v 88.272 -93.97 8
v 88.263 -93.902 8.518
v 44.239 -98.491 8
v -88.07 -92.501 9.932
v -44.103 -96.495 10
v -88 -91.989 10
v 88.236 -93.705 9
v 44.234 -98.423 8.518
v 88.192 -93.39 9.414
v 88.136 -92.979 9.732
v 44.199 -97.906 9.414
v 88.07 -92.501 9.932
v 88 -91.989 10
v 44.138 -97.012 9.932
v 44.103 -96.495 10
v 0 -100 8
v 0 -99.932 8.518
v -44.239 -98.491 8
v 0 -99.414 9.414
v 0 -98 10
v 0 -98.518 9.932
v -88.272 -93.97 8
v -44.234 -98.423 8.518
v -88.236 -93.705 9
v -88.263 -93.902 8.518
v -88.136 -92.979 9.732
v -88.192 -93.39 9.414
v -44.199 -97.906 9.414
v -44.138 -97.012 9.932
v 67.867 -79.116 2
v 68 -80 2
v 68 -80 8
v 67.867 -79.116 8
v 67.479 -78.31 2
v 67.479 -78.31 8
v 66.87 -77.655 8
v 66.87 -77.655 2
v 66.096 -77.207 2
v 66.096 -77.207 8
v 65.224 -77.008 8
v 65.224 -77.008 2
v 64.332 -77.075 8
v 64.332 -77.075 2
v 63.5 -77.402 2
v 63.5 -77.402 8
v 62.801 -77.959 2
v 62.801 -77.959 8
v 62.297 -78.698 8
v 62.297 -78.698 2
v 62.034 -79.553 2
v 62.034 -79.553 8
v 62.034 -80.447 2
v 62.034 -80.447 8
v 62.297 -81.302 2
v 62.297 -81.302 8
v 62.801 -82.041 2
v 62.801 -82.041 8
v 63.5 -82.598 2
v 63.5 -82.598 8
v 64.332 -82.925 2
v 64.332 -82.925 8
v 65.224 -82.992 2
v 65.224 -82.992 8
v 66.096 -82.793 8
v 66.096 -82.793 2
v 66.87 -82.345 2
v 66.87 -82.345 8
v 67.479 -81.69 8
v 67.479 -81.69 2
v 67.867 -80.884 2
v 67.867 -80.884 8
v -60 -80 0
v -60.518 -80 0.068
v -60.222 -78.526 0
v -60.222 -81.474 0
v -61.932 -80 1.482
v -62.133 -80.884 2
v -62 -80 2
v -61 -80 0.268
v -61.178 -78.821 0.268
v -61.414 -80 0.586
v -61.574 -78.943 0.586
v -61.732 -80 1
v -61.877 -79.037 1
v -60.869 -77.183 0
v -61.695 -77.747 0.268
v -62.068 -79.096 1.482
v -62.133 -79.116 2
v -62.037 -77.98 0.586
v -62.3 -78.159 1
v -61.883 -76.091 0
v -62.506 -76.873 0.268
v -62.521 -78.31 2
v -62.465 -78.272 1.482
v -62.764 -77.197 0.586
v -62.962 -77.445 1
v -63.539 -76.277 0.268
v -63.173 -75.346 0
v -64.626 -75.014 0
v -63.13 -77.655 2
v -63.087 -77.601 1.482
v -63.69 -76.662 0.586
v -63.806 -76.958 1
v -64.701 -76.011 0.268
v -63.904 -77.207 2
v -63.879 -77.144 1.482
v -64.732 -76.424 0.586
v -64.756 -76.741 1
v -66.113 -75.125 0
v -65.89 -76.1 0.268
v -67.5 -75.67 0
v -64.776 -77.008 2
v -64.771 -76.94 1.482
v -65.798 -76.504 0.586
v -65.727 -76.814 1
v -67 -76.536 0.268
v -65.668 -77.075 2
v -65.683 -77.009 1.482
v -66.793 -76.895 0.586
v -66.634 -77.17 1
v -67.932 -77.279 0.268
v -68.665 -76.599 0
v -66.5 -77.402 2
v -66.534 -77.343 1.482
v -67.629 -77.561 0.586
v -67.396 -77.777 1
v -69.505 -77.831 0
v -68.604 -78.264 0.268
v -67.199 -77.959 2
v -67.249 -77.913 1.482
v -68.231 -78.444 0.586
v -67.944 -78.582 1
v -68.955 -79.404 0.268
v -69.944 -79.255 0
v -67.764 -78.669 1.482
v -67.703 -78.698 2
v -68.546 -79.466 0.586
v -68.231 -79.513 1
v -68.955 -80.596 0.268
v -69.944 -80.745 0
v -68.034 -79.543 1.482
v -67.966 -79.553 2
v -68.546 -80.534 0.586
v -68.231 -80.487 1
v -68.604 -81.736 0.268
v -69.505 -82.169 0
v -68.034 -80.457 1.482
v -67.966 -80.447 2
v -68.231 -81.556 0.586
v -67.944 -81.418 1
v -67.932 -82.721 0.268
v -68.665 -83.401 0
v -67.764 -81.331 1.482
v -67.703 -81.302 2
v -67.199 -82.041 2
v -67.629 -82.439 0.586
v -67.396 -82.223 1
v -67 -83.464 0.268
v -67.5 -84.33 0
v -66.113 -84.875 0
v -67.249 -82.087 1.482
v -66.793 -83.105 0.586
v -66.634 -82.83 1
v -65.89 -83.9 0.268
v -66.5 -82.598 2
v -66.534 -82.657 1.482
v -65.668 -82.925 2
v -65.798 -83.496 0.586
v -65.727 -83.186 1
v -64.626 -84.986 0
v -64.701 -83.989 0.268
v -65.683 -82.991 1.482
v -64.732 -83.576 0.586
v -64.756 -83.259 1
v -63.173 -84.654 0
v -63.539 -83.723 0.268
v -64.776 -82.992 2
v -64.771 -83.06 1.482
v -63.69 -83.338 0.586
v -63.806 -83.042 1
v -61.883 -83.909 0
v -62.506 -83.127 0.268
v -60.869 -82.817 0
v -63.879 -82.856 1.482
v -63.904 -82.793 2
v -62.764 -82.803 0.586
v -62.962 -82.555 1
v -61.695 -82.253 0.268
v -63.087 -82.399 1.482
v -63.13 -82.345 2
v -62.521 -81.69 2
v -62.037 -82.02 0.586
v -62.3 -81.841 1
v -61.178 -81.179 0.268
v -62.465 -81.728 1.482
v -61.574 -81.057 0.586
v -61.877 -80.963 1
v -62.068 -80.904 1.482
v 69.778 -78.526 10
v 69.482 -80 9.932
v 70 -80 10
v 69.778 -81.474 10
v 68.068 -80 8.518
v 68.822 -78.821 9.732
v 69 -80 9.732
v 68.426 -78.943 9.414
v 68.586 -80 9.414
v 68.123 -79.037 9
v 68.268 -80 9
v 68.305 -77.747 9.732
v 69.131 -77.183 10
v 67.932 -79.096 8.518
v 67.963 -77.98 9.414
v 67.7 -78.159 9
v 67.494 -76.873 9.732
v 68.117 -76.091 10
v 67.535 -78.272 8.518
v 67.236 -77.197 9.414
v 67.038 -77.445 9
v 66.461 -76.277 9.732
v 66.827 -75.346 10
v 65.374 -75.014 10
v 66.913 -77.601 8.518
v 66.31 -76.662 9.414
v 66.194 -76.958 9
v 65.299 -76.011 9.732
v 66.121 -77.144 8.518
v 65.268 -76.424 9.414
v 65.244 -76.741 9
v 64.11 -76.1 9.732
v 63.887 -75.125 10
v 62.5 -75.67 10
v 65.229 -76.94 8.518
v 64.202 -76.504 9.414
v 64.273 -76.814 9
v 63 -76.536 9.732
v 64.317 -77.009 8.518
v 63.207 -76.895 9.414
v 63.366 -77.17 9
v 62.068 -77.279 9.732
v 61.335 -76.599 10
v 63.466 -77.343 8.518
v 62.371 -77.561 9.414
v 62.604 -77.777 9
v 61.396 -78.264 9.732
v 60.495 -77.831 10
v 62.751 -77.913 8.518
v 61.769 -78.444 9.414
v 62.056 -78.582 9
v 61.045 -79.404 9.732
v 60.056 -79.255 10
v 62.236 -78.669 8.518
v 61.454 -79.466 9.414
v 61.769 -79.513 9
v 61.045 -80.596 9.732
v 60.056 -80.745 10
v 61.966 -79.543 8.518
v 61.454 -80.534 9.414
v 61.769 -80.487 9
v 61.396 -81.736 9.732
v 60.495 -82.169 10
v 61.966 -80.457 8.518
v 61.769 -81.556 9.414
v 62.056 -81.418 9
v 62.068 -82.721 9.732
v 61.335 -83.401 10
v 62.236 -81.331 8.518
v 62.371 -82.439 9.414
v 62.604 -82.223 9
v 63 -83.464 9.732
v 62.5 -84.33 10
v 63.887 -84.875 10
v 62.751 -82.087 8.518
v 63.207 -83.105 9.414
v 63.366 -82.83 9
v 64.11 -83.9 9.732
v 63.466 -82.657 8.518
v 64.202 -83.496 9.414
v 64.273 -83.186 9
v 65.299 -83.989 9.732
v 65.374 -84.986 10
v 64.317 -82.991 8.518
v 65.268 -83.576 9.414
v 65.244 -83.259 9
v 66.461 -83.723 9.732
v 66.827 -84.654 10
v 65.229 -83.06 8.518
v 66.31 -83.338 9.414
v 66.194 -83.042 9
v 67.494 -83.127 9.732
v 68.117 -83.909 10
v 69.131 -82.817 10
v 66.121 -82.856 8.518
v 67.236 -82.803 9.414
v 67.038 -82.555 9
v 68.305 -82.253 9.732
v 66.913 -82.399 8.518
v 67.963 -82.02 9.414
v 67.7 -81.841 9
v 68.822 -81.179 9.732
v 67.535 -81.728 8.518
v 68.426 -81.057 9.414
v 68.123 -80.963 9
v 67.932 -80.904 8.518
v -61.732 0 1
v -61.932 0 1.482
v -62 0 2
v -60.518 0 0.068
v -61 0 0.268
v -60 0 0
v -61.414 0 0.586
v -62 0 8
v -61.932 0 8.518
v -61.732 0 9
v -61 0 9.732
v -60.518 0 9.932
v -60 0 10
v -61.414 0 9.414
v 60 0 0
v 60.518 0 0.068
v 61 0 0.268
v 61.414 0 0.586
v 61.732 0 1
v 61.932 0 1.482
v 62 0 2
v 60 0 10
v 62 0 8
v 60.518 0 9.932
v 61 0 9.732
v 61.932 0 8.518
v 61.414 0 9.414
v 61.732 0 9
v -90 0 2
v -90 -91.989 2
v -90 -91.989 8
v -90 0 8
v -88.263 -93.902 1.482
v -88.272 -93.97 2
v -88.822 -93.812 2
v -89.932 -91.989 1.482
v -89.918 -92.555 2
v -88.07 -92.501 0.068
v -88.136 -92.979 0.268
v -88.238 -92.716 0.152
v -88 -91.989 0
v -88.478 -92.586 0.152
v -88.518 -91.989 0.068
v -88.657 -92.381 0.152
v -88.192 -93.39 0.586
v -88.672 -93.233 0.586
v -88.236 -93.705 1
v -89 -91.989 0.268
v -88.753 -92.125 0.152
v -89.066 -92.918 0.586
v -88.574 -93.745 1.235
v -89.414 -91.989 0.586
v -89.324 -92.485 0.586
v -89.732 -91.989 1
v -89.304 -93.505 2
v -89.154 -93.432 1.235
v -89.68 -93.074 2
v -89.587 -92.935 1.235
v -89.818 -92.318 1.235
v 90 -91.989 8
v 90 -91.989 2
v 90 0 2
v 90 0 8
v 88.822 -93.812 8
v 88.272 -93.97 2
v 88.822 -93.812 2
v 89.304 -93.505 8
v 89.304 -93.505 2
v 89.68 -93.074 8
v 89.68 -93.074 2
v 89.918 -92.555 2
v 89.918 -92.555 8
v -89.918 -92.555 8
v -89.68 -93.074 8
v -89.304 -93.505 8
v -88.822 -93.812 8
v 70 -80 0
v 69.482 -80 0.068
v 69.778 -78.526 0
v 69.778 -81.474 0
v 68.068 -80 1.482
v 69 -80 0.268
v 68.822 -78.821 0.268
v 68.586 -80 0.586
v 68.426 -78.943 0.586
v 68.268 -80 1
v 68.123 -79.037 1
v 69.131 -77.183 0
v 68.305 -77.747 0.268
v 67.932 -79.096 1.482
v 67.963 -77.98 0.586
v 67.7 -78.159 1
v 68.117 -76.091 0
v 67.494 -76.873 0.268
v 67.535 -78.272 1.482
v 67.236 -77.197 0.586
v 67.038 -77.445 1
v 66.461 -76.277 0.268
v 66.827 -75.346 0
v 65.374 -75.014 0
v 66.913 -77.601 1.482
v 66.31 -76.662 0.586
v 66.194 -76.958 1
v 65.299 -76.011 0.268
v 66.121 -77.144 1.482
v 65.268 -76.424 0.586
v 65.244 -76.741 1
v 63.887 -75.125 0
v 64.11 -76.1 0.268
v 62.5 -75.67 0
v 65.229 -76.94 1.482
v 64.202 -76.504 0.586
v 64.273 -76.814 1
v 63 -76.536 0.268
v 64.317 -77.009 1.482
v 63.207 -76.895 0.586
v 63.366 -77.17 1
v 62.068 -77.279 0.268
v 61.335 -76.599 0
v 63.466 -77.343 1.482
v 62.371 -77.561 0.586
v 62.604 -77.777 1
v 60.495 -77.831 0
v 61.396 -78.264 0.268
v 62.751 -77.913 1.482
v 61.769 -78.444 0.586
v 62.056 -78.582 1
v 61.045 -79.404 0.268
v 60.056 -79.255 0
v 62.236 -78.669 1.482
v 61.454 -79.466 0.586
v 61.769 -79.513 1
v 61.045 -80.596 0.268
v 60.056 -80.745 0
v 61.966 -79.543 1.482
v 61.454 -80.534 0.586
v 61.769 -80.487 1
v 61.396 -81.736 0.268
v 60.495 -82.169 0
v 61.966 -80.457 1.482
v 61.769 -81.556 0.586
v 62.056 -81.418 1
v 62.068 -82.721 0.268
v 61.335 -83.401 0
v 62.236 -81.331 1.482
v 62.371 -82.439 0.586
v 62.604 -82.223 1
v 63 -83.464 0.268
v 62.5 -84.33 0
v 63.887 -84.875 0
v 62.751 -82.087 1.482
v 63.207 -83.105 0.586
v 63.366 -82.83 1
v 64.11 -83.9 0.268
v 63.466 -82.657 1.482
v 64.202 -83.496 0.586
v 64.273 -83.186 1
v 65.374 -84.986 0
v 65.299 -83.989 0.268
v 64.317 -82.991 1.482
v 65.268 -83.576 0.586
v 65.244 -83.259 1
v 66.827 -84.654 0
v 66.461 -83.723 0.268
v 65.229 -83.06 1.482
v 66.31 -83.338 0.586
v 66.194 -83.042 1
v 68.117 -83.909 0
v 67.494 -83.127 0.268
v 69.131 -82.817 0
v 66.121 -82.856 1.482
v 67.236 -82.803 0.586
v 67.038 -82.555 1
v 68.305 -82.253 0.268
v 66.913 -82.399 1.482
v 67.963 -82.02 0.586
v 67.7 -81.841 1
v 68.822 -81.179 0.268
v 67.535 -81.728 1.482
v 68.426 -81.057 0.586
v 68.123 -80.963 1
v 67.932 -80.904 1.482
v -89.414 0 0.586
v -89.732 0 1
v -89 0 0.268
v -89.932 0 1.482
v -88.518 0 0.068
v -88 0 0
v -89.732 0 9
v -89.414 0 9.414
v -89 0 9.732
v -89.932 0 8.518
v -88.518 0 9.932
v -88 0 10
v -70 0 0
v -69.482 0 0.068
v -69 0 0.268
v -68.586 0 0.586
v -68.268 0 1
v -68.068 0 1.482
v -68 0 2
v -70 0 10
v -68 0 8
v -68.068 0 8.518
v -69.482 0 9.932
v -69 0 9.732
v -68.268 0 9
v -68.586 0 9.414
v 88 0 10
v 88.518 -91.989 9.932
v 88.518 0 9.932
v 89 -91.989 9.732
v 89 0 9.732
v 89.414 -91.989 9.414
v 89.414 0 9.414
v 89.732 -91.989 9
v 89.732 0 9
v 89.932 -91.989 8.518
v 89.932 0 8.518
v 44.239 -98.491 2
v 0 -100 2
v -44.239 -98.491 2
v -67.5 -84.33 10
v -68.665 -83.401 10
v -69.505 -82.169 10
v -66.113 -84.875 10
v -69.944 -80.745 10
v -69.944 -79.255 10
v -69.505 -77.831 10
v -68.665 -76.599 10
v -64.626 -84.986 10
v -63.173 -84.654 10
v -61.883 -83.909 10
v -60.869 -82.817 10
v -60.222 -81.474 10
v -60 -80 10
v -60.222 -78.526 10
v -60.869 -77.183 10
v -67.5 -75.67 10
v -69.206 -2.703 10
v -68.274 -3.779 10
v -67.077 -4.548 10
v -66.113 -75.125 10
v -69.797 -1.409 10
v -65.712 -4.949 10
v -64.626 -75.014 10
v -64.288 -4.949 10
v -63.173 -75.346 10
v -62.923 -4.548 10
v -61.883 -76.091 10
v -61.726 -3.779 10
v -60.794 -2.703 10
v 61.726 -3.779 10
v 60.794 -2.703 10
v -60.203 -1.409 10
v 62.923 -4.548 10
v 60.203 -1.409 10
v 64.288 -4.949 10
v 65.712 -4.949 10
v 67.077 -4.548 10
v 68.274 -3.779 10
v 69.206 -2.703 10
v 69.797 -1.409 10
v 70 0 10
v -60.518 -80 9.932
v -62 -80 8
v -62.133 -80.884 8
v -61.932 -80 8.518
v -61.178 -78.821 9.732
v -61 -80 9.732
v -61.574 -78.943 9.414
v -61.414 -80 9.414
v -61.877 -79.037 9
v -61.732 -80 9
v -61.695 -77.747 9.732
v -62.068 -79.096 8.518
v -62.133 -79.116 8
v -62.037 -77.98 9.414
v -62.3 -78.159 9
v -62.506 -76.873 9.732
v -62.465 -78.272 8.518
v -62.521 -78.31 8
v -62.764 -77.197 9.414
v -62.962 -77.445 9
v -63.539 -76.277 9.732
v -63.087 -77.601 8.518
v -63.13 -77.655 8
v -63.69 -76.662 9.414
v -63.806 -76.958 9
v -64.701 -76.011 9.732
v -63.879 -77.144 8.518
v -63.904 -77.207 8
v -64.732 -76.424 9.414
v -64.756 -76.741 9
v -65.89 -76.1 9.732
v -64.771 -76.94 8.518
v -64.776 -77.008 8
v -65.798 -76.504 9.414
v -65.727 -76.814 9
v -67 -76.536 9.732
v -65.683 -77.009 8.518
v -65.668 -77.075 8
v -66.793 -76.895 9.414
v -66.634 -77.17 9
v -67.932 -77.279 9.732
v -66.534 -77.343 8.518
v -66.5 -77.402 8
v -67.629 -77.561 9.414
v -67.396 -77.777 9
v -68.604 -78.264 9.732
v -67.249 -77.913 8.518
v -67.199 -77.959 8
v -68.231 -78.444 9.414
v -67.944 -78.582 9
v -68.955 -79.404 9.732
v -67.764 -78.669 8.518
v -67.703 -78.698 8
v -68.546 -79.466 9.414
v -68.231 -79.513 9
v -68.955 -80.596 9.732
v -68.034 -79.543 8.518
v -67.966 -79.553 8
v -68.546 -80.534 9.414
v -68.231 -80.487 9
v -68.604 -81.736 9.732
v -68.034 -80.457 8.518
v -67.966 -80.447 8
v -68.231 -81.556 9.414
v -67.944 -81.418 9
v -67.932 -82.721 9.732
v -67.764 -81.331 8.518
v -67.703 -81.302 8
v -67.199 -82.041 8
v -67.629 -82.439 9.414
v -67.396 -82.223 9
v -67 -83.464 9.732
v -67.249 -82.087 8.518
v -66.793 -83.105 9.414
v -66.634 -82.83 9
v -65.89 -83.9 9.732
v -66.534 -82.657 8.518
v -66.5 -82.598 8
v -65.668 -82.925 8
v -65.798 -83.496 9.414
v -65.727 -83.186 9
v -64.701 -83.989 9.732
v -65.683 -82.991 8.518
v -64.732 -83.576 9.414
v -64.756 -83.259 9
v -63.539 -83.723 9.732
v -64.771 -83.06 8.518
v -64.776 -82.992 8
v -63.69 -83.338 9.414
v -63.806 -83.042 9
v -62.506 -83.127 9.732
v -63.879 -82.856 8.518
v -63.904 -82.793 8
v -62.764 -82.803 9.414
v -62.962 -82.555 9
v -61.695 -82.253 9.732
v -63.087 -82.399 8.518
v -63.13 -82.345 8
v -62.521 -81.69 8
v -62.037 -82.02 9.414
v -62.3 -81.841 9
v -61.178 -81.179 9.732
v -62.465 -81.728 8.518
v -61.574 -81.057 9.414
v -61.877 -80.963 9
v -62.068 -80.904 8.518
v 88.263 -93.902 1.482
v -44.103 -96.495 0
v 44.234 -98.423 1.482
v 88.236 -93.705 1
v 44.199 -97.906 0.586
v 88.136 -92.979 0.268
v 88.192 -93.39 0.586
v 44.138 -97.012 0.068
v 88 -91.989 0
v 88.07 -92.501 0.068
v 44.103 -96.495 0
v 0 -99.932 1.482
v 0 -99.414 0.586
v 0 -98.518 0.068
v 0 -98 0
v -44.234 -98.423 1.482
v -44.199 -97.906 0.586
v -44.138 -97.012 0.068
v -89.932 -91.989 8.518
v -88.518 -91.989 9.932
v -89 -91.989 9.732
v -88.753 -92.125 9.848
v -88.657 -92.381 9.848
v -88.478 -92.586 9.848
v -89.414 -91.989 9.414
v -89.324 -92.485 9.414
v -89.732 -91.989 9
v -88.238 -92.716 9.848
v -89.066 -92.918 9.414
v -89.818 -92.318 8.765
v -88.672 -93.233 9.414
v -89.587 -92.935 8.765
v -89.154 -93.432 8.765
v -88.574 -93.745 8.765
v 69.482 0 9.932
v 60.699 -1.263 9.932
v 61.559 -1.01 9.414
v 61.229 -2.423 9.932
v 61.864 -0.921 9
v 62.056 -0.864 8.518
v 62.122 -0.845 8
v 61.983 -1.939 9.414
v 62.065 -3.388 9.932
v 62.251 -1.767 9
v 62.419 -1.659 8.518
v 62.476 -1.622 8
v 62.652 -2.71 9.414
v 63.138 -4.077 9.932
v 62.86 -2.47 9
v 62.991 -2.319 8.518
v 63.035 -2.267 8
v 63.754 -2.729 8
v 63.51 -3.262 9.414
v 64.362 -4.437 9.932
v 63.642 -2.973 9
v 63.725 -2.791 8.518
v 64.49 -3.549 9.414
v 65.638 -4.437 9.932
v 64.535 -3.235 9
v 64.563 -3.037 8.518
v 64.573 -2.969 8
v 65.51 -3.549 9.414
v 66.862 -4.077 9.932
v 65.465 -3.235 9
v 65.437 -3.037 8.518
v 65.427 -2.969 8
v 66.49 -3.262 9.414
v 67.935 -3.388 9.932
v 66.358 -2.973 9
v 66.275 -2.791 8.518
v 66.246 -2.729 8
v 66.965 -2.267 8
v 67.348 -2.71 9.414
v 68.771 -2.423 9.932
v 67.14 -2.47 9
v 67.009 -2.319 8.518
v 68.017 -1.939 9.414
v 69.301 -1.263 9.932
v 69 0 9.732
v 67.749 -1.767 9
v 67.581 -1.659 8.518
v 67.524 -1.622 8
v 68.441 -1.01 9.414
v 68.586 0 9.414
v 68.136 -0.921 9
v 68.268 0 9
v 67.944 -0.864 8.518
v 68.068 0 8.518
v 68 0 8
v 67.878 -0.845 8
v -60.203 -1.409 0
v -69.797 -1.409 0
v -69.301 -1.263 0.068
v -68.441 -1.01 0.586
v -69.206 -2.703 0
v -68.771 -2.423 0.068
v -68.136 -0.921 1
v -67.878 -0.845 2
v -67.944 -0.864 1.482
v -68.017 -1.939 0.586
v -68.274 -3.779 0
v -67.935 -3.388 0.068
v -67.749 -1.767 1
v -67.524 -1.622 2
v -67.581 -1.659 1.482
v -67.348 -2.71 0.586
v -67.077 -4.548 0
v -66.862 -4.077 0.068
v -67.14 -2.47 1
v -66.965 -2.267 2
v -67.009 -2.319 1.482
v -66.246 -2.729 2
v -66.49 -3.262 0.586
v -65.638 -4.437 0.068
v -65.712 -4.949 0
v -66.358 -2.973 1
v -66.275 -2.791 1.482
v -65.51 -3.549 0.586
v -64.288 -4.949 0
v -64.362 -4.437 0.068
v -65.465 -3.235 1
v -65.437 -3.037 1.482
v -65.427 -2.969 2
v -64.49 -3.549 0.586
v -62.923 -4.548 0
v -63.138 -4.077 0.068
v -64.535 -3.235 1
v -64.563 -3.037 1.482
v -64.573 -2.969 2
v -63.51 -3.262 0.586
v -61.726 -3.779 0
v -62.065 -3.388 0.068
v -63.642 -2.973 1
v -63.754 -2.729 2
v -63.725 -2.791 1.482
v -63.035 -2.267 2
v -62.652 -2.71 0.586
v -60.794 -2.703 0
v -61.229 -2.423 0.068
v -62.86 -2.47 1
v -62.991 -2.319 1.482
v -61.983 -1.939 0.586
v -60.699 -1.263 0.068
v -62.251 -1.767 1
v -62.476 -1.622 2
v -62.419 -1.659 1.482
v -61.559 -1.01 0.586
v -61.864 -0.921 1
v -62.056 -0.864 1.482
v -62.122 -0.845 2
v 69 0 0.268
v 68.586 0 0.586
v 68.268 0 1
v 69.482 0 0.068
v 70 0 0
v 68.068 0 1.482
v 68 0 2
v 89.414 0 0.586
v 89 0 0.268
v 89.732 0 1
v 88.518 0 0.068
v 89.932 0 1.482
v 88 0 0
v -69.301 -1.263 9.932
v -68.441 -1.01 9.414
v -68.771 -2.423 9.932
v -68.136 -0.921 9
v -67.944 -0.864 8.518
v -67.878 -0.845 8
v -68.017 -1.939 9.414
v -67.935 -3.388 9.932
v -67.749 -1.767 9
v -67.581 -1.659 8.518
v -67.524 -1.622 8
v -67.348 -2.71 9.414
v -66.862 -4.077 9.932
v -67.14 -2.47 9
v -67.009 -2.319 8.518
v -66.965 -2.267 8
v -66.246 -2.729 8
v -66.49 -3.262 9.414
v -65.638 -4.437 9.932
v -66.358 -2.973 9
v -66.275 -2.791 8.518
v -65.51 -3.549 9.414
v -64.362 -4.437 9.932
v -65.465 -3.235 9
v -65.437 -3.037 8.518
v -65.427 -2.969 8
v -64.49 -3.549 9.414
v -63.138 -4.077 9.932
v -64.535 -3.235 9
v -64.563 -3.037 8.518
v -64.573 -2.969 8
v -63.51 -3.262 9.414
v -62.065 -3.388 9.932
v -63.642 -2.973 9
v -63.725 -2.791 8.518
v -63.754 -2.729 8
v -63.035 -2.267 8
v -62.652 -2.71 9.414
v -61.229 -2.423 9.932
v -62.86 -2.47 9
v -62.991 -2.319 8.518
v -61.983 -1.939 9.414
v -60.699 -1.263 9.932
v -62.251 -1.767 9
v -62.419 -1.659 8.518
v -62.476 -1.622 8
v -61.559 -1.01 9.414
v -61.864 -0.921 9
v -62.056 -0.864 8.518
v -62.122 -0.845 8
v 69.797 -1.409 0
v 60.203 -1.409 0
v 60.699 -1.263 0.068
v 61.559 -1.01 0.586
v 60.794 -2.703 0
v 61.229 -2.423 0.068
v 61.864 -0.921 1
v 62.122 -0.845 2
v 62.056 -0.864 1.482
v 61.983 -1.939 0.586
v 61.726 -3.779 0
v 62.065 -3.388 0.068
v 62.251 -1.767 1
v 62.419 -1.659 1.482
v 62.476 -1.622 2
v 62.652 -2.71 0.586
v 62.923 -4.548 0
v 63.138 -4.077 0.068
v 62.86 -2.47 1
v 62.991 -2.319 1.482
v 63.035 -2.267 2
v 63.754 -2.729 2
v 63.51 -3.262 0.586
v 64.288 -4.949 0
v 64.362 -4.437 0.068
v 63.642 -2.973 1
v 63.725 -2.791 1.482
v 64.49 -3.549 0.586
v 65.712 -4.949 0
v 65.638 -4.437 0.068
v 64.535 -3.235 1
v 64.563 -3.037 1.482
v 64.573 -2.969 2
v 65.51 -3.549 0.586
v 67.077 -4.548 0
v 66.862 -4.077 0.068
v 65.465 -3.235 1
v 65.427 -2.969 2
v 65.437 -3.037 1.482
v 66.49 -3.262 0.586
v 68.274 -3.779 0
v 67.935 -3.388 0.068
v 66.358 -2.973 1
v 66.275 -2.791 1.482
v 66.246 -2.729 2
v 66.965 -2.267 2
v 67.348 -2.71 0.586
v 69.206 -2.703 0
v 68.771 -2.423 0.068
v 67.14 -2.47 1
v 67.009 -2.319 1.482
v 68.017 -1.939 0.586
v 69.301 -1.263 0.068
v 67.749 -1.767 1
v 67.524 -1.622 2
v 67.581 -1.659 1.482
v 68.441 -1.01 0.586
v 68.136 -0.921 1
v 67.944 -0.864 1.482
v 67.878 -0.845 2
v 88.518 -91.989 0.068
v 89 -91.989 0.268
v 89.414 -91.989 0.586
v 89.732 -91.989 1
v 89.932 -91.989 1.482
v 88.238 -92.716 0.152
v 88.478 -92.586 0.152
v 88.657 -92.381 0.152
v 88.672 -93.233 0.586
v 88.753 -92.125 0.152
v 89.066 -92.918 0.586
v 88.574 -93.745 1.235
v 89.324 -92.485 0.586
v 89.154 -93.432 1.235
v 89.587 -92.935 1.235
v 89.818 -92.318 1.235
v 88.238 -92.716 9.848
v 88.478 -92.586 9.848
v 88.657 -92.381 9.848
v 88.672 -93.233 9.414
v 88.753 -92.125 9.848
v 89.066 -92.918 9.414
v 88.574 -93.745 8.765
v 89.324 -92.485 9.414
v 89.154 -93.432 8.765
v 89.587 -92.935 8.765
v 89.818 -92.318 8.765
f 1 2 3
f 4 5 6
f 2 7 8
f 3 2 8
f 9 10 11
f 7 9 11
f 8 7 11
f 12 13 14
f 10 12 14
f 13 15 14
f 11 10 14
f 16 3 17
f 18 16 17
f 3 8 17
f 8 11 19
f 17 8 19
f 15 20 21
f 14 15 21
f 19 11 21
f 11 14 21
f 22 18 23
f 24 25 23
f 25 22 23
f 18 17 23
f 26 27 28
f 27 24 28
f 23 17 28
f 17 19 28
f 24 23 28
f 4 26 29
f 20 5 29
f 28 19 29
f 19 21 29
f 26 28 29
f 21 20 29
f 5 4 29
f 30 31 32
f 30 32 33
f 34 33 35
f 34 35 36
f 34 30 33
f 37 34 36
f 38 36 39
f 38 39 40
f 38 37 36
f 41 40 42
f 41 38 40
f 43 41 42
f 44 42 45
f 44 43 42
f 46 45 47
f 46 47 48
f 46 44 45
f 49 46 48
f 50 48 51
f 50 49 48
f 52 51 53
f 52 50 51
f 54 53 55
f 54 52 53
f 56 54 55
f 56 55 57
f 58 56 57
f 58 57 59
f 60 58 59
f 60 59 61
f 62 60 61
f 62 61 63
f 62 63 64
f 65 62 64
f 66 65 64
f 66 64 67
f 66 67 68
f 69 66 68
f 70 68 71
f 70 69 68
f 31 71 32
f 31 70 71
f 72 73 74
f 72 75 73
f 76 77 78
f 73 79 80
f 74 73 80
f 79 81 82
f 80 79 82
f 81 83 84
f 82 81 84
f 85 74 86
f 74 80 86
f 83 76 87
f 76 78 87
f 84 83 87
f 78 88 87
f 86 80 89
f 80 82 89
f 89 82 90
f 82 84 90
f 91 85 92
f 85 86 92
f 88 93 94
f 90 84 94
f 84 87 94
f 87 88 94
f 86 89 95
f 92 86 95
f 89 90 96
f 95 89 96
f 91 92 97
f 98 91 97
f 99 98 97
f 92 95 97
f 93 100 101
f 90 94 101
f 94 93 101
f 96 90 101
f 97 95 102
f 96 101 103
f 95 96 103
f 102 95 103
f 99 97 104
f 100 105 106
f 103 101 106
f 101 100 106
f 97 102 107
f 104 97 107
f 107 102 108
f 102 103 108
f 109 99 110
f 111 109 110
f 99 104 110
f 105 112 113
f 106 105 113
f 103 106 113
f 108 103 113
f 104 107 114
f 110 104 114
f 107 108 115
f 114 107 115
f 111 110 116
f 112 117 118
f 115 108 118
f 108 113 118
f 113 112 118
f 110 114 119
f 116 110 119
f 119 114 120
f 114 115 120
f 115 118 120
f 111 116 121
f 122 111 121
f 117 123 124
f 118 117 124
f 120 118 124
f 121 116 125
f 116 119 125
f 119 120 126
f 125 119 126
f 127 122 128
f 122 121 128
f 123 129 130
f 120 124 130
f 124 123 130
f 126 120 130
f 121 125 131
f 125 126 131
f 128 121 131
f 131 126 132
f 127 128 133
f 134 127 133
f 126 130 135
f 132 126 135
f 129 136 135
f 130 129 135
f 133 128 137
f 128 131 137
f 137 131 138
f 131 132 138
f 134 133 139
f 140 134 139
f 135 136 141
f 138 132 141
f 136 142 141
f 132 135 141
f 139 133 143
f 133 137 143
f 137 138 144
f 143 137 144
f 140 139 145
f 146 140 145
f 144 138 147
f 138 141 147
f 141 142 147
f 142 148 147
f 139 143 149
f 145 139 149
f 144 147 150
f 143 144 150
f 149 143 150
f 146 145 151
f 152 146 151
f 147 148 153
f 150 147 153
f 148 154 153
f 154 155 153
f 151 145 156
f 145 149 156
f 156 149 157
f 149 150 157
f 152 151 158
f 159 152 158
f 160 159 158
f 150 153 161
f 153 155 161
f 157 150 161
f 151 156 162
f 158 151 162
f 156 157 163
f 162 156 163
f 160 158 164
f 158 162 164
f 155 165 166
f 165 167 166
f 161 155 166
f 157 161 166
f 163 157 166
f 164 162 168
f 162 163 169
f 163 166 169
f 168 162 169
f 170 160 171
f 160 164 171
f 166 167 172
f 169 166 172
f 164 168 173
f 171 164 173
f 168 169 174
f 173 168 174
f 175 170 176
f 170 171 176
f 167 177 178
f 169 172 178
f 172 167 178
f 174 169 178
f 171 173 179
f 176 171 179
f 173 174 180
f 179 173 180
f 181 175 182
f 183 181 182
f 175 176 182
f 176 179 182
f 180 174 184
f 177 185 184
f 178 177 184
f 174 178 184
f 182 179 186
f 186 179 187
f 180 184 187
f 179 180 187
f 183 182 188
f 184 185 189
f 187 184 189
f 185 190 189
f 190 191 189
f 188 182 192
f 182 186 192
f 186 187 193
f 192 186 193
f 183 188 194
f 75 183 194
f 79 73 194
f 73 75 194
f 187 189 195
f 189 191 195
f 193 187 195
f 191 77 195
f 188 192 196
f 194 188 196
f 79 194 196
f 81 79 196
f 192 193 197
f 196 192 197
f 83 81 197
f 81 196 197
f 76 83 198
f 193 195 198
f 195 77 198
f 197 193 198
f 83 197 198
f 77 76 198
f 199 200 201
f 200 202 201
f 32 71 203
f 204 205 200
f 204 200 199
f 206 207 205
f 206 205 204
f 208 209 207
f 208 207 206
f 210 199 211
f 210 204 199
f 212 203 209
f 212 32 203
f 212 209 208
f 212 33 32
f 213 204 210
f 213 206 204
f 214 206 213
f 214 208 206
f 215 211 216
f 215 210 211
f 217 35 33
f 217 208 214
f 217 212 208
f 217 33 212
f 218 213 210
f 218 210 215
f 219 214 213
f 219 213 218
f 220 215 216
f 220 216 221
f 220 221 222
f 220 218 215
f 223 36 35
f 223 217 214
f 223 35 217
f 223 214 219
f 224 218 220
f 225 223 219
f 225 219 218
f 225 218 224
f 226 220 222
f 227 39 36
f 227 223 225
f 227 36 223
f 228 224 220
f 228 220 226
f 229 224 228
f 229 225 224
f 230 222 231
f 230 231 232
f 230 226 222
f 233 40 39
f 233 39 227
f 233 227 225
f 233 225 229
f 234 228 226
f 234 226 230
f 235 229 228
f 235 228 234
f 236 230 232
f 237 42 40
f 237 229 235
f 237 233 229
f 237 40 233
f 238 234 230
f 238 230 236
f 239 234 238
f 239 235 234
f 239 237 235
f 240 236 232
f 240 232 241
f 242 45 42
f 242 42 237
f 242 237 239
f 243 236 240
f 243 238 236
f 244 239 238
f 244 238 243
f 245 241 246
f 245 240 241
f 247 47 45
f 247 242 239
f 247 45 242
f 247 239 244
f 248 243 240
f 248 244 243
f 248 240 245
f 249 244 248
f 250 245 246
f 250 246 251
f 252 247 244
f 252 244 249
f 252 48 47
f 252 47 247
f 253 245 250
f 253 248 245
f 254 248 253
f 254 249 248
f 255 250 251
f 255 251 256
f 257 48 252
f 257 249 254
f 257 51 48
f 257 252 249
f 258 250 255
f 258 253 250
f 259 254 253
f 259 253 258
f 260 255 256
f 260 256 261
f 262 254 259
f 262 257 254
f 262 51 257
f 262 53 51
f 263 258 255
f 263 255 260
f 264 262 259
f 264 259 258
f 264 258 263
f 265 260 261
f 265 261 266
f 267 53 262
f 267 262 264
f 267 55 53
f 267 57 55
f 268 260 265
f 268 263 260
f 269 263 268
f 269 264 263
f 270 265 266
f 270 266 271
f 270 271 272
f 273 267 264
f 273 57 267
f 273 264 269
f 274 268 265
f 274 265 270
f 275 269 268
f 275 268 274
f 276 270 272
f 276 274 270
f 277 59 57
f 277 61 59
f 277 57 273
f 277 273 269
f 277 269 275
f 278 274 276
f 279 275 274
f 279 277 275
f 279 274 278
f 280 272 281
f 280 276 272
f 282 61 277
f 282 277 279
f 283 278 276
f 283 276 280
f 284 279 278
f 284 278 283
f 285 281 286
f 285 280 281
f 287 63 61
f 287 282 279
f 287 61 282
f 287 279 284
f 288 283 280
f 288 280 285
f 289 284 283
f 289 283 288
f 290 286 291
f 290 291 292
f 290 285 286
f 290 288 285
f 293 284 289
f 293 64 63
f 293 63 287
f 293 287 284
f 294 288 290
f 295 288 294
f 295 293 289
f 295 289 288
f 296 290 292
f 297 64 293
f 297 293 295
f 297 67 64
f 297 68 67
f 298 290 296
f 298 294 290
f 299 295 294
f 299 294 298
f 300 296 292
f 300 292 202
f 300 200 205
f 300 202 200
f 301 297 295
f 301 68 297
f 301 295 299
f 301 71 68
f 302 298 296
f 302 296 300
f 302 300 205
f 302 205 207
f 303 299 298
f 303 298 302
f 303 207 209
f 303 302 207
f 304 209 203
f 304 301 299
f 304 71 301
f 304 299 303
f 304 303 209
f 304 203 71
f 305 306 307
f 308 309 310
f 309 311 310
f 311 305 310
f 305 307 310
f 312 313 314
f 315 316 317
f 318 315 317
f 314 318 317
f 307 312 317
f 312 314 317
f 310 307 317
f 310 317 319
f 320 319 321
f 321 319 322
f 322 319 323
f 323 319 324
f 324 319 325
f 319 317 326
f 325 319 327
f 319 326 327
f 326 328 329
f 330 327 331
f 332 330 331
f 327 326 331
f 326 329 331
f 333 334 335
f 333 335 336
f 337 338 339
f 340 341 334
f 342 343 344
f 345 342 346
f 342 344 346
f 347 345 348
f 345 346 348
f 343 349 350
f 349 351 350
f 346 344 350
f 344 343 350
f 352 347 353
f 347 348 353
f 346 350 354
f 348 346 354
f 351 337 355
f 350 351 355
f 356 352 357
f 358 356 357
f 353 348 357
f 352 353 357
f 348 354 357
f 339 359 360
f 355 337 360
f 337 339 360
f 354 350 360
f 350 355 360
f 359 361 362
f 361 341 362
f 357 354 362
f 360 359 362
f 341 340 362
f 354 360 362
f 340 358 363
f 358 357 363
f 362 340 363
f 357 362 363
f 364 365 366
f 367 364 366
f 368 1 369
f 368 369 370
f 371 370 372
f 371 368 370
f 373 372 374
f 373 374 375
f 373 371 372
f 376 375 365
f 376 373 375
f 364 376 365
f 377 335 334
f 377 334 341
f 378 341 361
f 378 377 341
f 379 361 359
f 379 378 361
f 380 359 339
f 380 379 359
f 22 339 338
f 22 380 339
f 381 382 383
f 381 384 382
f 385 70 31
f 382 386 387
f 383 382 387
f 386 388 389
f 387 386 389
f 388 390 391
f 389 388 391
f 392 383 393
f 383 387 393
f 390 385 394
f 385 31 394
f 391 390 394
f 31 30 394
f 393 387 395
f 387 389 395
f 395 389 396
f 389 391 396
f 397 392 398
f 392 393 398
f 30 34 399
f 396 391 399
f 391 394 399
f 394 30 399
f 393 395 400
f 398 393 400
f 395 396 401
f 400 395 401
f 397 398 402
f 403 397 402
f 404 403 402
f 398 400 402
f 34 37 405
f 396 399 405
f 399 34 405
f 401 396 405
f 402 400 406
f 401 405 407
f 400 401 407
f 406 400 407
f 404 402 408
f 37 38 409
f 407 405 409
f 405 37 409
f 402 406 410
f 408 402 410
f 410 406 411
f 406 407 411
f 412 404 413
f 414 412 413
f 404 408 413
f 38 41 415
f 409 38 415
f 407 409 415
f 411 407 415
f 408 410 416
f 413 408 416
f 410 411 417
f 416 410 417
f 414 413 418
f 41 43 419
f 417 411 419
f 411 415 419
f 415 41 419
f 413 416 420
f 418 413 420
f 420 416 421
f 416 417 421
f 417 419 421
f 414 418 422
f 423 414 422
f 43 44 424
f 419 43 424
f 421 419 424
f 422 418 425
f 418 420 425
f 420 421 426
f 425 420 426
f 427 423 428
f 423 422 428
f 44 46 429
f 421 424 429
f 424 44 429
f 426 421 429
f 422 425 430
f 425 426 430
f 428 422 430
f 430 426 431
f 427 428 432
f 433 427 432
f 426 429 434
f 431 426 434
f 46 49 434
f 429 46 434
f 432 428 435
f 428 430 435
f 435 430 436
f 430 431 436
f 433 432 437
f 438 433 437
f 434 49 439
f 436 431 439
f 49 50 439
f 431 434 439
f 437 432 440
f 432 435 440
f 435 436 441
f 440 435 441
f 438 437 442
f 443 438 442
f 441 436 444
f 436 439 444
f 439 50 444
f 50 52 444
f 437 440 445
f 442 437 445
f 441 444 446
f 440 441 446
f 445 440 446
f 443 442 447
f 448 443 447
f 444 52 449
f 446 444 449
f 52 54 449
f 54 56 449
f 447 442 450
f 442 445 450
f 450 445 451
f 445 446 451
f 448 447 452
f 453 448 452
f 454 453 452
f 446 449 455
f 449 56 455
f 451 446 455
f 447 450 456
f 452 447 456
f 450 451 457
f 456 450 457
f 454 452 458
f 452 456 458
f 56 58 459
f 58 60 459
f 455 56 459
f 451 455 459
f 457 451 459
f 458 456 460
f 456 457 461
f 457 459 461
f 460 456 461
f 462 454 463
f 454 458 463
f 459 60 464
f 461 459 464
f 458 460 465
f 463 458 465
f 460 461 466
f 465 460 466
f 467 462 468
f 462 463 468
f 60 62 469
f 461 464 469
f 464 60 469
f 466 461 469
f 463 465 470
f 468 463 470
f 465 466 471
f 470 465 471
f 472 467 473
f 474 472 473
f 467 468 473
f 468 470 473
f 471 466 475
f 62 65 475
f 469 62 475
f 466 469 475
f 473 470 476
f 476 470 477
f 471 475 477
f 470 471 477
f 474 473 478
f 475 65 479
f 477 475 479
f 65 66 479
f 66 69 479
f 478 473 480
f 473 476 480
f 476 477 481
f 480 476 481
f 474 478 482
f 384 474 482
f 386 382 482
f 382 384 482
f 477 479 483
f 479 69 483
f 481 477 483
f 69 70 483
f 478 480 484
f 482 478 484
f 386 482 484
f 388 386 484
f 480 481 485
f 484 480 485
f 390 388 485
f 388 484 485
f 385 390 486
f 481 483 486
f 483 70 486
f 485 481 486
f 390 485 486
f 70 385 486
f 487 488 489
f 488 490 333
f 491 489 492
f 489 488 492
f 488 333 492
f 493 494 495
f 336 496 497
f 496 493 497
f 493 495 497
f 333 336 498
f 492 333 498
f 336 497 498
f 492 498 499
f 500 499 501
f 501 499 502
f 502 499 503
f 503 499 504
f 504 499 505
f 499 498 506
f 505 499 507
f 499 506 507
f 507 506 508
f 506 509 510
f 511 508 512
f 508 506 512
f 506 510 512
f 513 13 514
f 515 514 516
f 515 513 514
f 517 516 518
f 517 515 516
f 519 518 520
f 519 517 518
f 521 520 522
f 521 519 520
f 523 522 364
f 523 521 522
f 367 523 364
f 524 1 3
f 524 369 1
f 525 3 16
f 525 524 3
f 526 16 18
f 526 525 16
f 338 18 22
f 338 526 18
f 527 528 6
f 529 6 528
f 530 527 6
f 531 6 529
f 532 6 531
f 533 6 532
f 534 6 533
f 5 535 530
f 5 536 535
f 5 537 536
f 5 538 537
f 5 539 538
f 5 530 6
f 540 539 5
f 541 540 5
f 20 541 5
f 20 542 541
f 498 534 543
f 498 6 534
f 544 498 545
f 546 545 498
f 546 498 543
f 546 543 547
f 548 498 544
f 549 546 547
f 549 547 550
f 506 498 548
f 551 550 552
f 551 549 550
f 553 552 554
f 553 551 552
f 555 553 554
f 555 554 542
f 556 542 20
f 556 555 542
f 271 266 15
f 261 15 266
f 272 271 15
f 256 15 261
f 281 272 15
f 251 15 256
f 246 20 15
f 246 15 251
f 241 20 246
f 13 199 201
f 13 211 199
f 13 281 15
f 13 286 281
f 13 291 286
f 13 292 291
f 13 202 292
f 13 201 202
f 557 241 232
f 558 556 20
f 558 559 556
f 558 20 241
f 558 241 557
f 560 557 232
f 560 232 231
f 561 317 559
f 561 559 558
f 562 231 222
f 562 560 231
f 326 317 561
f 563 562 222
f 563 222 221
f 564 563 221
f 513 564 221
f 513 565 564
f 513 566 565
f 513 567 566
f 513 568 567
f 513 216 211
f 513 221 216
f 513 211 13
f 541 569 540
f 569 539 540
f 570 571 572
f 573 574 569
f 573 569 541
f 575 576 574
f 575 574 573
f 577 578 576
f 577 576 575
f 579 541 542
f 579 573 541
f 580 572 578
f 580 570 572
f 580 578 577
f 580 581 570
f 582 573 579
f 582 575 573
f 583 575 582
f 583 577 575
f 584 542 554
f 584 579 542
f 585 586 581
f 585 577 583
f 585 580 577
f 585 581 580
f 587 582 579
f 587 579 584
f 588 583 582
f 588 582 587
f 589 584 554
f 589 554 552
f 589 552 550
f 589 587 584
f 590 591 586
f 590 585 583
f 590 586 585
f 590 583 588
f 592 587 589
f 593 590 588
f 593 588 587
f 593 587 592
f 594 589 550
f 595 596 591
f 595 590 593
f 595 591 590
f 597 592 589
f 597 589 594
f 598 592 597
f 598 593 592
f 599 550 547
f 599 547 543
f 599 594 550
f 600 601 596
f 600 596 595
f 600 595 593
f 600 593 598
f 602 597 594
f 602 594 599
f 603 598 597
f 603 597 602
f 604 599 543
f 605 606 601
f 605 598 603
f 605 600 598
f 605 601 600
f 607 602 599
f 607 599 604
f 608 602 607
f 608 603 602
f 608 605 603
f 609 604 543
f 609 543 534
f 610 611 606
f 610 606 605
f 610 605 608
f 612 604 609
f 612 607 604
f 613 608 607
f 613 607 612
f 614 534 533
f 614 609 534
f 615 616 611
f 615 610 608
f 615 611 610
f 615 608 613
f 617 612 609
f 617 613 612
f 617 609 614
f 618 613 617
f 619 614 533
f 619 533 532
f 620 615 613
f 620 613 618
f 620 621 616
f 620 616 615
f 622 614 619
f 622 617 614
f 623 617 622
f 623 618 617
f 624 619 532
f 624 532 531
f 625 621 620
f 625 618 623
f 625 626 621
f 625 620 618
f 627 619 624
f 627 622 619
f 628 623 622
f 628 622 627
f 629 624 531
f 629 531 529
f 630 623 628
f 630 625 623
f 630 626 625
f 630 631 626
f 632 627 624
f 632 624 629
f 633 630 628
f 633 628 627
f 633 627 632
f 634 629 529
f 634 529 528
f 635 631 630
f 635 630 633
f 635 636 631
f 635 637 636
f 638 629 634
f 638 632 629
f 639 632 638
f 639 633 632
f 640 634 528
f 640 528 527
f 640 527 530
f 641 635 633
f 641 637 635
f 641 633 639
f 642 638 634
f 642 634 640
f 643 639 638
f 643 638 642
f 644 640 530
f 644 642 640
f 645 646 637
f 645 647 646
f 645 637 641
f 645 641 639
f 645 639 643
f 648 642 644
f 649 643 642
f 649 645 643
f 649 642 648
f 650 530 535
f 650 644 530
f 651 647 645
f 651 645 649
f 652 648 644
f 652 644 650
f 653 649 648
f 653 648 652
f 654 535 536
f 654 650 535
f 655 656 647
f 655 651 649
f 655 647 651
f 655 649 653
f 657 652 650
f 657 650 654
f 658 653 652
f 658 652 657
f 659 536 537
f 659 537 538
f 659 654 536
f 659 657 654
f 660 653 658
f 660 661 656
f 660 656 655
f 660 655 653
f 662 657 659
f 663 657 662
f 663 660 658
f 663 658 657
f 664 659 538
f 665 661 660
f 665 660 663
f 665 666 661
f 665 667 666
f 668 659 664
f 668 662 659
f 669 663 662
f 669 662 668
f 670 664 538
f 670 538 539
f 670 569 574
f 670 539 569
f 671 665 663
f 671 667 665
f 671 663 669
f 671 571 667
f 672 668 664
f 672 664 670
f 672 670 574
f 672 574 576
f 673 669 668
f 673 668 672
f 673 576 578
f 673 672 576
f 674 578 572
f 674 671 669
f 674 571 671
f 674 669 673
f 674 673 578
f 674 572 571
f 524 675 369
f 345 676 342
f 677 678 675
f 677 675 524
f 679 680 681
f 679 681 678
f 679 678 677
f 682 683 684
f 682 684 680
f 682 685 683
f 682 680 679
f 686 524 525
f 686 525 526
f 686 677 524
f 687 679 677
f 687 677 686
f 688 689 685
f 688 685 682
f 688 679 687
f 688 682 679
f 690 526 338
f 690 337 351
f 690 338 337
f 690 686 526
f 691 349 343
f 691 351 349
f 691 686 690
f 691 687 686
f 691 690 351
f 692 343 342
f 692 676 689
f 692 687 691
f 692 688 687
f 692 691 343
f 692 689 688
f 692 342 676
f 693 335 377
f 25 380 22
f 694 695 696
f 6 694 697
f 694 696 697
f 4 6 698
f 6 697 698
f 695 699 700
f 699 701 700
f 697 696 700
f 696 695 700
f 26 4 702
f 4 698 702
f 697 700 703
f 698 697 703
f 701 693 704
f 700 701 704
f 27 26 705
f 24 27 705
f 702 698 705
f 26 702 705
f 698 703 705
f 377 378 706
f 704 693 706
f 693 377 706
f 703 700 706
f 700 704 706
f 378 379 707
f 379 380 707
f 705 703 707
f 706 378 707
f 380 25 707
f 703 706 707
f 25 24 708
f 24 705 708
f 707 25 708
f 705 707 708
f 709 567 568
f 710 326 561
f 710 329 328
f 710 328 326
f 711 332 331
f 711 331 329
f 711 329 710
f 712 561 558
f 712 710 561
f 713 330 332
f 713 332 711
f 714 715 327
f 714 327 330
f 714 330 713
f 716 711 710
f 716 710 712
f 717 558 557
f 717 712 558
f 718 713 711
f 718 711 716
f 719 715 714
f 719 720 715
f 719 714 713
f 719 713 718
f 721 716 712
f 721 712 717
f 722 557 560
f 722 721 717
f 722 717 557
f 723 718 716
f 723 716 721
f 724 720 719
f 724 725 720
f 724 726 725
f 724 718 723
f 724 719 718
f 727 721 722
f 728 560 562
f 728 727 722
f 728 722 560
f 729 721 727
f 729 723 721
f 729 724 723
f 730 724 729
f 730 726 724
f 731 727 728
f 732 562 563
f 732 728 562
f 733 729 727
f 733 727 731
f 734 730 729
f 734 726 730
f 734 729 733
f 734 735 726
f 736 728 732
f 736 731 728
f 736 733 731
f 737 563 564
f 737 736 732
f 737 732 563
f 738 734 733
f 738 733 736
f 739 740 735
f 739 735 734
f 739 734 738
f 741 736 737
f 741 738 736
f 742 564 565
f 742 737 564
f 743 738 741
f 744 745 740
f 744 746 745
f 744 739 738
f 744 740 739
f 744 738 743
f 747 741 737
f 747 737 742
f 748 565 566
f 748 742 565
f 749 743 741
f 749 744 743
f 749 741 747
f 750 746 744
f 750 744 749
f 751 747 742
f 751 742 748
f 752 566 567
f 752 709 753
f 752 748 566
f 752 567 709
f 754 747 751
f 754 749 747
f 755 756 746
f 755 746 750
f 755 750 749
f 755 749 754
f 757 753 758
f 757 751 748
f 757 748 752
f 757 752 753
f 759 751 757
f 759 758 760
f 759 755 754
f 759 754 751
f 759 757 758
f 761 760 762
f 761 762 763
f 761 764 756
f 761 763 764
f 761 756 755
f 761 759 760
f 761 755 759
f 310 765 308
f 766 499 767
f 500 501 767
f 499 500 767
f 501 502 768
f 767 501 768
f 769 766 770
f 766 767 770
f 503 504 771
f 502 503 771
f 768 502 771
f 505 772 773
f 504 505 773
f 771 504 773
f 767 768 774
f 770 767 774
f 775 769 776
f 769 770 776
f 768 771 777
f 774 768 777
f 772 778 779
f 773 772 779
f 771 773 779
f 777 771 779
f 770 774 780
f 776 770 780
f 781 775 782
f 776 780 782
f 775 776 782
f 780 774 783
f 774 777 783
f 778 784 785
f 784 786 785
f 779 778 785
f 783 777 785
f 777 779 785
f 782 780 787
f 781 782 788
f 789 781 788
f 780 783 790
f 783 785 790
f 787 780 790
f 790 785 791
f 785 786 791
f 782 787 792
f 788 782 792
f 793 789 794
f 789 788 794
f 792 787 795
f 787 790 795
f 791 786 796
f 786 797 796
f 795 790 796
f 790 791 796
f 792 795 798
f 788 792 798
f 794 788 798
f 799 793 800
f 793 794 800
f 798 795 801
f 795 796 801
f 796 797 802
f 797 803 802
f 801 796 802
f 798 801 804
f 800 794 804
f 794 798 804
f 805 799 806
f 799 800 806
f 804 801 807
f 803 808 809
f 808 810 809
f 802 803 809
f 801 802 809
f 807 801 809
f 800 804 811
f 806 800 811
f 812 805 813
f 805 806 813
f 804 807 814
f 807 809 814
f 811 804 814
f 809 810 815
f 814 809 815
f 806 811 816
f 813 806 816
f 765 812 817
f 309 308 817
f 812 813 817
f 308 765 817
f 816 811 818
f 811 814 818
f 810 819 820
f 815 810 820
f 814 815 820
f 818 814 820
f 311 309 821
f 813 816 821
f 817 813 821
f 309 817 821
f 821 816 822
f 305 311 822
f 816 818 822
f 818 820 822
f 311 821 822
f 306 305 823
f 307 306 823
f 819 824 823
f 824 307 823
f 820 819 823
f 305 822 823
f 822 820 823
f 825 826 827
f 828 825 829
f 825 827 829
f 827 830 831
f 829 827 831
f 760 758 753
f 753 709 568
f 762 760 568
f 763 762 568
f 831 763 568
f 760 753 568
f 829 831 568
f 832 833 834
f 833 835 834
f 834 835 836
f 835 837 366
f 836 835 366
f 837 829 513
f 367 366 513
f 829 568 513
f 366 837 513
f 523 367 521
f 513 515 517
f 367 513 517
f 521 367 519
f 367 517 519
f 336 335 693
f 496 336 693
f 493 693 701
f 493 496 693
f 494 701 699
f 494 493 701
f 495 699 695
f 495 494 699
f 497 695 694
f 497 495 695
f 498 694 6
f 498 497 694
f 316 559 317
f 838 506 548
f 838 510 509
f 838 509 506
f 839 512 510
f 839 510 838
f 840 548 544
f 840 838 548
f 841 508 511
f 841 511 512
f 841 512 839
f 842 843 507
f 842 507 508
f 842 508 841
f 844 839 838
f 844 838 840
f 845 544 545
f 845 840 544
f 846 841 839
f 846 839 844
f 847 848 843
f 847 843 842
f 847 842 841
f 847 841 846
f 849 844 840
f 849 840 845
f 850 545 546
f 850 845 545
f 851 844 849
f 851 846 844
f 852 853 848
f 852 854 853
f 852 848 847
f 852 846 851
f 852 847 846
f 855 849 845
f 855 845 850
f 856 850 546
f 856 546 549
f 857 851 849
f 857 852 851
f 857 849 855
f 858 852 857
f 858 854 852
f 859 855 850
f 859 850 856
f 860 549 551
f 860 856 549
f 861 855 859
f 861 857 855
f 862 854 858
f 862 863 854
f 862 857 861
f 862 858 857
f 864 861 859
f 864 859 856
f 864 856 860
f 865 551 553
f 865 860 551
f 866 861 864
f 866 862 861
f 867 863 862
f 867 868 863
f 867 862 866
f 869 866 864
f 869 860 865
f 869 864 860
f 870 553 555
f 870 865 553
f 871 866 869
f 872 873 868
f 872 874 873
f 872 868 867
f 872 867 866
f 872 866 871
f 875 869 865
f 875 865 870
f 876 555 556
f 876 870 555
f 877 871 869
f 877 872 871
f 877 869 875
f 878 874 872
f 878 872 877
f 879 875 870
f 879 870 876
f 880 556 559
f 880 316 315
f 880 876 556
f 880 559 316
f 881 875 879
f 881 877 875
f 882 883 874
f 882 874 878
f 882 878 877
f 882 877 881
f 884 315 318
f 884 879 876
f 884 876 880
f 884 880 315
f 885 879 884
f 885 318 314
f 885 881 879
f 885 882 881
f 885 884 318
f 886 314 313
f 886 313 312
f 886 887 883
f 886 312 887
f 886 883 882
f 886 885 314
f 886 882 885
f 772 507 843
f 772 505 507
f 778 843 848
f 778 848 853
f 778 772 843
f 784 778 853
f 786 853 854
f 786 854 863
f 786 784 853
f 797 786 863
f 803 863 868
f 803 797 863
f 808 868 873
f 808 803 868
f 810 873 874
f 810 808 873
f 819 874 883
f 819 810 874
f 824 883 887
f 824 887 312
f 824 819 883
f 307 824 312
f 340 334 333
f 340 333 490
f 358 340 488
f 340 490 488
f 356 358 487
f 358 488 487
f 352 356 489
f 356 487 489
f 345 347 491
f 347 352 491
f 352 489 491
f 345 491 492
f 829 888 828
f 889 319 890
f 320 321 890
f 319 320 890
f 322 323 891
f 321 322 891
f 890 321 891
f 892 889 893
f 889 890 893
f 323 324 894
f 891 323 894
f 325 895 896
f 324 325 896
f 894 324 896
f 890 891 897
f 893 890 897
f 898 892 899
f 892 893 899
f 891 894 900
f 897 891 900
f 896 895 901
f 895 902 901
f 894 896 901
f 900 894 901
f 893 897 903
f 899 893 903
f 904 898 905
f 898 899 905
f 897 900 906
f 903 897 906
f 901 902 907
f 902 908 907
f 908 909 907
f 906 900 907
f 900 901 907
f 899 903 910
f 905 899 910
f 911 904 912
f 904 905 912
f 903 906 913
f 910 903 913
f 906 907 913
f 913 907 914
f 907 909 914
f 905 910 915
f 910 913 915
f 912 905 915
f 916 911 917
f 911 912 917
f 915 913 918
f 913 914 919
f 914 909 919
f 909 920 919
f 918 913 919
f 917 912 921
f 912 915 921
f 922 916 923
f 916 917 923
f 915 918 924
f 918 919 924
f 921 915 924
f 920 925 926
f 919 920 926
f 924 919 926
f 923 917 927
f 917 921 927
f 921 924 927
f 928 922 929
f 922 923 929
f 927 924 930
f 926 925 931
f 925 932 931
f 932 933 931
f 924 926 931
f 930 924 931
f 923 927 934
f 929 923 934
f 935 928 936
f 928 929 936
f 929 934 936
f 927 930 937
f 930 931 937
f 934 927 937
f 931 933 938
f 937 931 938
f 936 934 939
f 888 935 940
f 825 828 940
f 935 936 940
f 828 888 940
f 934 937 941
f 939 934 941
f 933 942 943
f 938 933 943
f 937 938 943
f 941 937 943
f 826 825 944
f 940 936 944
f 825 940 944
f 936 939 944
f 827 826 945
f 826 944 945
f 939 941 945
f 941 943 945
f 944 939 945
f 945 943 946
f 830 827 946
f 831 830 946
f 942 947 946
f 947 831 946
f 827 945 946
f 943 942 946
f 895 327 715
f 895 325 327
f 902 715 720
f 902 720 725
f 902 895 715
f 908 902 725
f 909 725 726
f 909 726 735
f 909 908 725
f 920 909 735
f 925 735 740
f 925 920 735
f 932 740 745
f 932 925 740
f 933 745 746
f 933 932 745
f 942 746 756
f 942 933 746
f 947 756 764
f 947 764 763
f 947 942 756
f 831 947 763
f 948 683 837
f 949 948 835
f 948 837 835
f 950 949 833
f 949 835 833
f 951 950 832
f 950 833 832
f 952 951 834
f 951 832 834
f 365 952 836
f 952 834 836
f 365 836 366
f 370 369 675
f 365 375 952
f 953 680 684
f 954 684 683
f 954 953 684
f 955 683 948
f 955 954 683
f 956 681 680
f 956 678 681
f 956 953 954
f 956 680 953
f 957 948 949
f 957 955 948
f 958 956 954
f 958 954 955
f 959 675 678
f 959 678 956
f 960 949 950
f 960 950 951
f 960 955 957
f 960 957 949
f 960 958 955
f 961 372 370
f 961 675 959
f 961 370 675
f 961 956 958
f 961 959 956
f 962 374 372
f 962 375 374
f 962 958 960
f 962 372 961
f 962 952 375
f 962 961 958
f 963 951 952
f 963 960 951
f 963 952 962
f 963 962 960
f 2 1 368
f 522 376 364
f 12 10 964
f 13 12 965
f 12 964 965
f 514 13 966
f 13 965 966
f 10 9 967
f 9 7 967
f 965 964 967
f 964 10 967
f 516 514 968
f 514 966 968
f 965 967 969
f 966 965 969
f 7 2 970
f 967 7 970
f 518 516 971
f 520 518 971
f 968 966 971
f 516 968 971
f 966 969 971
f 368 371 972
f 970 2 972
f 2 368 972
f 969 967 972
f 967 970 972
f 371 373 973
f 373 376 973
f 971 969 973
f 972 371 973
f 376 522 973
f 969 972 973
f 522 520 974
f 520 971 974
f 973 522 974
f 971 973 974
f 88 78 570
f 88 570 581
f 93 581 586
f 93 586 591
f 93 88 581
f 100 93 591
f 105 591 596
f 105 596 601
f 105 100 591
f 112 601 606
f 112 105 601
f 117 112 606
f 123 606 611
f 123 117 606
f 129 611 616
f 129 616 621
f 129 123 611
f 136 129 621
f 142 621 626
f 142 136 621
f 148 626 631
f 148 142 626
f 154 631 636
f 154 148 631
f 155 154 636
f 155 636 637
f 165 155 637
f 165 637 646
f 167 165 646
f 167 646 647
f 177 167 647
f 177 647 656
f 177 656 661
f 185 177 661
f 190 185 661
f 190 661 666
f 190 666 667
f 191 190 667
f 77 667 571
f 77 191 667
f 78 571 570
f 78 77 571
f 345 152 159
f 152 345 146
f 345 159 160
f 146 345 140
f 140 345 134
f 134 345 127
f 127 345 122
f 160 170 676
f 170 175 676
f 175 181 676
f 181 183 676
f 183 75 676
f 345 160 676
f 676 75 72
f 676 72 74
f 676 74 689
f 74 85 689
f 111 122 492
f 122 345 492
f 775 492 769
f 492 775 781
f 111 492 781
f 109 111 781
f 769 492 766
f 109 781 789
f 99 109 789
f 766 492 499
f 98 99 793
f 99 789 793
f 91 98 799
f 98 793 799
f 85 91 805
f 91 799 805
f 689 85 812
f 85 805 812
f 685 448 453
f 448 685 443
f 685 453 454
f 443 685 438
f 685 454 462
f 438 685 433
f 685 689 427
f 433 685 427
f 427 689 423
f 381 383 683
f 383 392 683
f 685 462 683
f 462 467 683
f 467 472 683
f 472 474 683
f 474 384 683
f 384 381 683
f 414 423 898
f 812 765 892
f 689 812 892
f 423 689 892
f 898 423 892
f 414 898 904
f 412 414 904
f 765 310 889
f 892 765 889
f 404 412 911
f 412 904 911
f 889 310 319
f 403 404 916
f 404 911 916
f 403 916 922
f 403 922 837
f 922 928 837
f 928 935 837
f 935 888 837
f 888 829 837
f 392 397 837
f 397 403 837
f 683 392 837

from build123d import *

# Parameters (mm, degrees)
SKETCH2_W                 = 180
SKETCH2_H                 = 180
BOSS_EXTRUDE1_DEPTH       = 10
SKETCH4_R                 = 3
CUT_EXTRUDE4_DEPTH        = 10
LPATTERN2_COUNT           = 2
LPATTERN2_PITCH           = 130
LPATTERN2_COUNT_DIR2      = 2
LPATTERN2_PITCH_DIR2      = 80
LPATTERN3_COUNT           = 2
LPATTERN3_PITCH           = 80
LPATTERN3_COPY_1_SKETCH_R = 3
LPATTERN3_COPY_1_DEPTH    = 10
LPATTERN3_COPY_2_SKETCH_R = 3
LPATTERN3_COPY_2_DEPTH    = 10
LPATTERN3_COPY_3_SKETCH_R = 3
LPATTERN3_COPY_3_DEPTH    = 10
FILLET1_R                 = 2
SKETCH5_W                 = 226.866804214
SKETCH5_H                 = 113.685590411
CUT_EXTRUDE5_DEPTH        = 10


with BuildPart() as part:
    # Sketch2 → Boss-Extrude1 (new body)
    with BuildSketch(Plane.XY):
        with Locations((0, -3.730444936)):
            Rectangle(SKETCH2_W, SKETCH2_H)
        with BuildLine():
            ThreePointArc((-90, 86.269555064), (0, 100), (90, 86.269555064))
            Line((90, 86.269555064), (-90, 86.269555064))
        make_face()
        with BuildLine():
            ThreePointArc((90, -93.730444936), (0, -100), (-90, -93.730444936))
            Line((-90, -93.730444936), (90, -93.730444936))
        make_face()
    extrude(amount=BOSS_EXTRUDE1_DEPTH)

    # Sketch4 → Cut-Extrude4 (cut)
    with BuildSketch(Plane.XY):
        with Locations((-65, 0)):
            Circle(SKETCH4_R)
    cut_extrude4 = extrude(amount=CUT_EXTRUDE4_DEPTH, mode=Mode.SUBTRACT)

    # LPattern2: Cut-Extrude4 2 × 2
    with Locations(*[(i * LPATTERN2_PITCH, -j * LPATTERN2_PITCH_DIR2, 0) for i in range(LPATTERN2_COUNT) for j in range(LPATTERN2_COUNT_DIR2) if (i, j) != (0, 0)]):
        add(cut_extrude4, mode=Mode.SUBTRACT)

    # LPattern3: Cut-Extrude4 ×2
    with Locations(*[(0, i * LPATTERN3_PITCH, 0) for i in range(1, LPATTERN3_COUNT)]):
        add(cut_extrude4, mode=Mode.SUBTRACT)

    # LPattern3 copy 1 sketch → LPattern3 copy 1 (cut)
    with BuildSketch(Plane.XY):
        with Locations((-65, 0)):
            Circle(LPATTERN3_COPY_1_SKETCH_R)
    extrude(amount=LPATTERN3_COPY_1_DEPTH, mode=Mode.SUBTRACT)

    # LPattern3 copy 2 sketch → LPattern3 copy 2 (cut)
    with BuildSketch(Plane(origin=(130, 80, 0), x_dir=(1, 0, 0), z_dir=(0, 0, 1))):
        with Locations((-65, 0)):
            Circle(LPATTERN3_COPY_2_SKETCH_R)
    extrude(amount=LPATTERN3_COPY_2_DEPTH, mode=Mode.SUBTRACT)

    # LPattern3 copy 3 sketch → LPattern3 copy 3 (cut)
    with BuildSketch(Plane(origin=(130, 0, 0), x_dir=(1, 0, 0), z_dir=(0, 0, 1))):
        with Locations((-65, 0)):
            Circle(LPATTERN3_COPY_3_SKETCH_R)
    extrude(amount=LPATTERN3_COPY_3_DEPTH, mode=Mode.SUBTRACT)

    # Fillet1
    fillet1_edges = [part.edges().sort_by_distance(p)[0] for p in [
        (0, 100, 10),
        (-90, -3.730444936, 10),
        (-68, 0, 0),
        (-68, 0, 10),
        (0, -100, 10),
        (62, 0, 10),
        (62, 0, 0),
        (-68, -80, 10),
        (-68, -80, 0),
        (62, -80, 10),
        (62, -80, 0),
        (62, 80, 0),
        (62, 80, 10),
        (-68, 80, 0),
        (-68, 80, 10),
        (90, -3.730444936, 10),
        (0, -100, 0),
        (-90, -3.730444936, 0),
        (0, 100, 0),
        (90, -3.730444936, 0),
        (90, -93.730444936, 5),
        (-90, -93.730444936, 5),
        (-90, 86.269555064, 5),
        (90, 86.269555064, 5),
    ]]
    fillet(fillet1_edges, radius=FILLET1_R)

    # Sketch5 → Cut-Extrude5 (cut)
    with BuildSketch(Plane.XY.offset(10)):
        with Locations((11.118369718, 56.842795206)):
            Rectangle(SKETCH5_W, SKETCH5_H)
    extrude(amount=-CUT_EXTRUDE5_DEPTH, mode=Mode.SUBTRACT)


solid = part.part
